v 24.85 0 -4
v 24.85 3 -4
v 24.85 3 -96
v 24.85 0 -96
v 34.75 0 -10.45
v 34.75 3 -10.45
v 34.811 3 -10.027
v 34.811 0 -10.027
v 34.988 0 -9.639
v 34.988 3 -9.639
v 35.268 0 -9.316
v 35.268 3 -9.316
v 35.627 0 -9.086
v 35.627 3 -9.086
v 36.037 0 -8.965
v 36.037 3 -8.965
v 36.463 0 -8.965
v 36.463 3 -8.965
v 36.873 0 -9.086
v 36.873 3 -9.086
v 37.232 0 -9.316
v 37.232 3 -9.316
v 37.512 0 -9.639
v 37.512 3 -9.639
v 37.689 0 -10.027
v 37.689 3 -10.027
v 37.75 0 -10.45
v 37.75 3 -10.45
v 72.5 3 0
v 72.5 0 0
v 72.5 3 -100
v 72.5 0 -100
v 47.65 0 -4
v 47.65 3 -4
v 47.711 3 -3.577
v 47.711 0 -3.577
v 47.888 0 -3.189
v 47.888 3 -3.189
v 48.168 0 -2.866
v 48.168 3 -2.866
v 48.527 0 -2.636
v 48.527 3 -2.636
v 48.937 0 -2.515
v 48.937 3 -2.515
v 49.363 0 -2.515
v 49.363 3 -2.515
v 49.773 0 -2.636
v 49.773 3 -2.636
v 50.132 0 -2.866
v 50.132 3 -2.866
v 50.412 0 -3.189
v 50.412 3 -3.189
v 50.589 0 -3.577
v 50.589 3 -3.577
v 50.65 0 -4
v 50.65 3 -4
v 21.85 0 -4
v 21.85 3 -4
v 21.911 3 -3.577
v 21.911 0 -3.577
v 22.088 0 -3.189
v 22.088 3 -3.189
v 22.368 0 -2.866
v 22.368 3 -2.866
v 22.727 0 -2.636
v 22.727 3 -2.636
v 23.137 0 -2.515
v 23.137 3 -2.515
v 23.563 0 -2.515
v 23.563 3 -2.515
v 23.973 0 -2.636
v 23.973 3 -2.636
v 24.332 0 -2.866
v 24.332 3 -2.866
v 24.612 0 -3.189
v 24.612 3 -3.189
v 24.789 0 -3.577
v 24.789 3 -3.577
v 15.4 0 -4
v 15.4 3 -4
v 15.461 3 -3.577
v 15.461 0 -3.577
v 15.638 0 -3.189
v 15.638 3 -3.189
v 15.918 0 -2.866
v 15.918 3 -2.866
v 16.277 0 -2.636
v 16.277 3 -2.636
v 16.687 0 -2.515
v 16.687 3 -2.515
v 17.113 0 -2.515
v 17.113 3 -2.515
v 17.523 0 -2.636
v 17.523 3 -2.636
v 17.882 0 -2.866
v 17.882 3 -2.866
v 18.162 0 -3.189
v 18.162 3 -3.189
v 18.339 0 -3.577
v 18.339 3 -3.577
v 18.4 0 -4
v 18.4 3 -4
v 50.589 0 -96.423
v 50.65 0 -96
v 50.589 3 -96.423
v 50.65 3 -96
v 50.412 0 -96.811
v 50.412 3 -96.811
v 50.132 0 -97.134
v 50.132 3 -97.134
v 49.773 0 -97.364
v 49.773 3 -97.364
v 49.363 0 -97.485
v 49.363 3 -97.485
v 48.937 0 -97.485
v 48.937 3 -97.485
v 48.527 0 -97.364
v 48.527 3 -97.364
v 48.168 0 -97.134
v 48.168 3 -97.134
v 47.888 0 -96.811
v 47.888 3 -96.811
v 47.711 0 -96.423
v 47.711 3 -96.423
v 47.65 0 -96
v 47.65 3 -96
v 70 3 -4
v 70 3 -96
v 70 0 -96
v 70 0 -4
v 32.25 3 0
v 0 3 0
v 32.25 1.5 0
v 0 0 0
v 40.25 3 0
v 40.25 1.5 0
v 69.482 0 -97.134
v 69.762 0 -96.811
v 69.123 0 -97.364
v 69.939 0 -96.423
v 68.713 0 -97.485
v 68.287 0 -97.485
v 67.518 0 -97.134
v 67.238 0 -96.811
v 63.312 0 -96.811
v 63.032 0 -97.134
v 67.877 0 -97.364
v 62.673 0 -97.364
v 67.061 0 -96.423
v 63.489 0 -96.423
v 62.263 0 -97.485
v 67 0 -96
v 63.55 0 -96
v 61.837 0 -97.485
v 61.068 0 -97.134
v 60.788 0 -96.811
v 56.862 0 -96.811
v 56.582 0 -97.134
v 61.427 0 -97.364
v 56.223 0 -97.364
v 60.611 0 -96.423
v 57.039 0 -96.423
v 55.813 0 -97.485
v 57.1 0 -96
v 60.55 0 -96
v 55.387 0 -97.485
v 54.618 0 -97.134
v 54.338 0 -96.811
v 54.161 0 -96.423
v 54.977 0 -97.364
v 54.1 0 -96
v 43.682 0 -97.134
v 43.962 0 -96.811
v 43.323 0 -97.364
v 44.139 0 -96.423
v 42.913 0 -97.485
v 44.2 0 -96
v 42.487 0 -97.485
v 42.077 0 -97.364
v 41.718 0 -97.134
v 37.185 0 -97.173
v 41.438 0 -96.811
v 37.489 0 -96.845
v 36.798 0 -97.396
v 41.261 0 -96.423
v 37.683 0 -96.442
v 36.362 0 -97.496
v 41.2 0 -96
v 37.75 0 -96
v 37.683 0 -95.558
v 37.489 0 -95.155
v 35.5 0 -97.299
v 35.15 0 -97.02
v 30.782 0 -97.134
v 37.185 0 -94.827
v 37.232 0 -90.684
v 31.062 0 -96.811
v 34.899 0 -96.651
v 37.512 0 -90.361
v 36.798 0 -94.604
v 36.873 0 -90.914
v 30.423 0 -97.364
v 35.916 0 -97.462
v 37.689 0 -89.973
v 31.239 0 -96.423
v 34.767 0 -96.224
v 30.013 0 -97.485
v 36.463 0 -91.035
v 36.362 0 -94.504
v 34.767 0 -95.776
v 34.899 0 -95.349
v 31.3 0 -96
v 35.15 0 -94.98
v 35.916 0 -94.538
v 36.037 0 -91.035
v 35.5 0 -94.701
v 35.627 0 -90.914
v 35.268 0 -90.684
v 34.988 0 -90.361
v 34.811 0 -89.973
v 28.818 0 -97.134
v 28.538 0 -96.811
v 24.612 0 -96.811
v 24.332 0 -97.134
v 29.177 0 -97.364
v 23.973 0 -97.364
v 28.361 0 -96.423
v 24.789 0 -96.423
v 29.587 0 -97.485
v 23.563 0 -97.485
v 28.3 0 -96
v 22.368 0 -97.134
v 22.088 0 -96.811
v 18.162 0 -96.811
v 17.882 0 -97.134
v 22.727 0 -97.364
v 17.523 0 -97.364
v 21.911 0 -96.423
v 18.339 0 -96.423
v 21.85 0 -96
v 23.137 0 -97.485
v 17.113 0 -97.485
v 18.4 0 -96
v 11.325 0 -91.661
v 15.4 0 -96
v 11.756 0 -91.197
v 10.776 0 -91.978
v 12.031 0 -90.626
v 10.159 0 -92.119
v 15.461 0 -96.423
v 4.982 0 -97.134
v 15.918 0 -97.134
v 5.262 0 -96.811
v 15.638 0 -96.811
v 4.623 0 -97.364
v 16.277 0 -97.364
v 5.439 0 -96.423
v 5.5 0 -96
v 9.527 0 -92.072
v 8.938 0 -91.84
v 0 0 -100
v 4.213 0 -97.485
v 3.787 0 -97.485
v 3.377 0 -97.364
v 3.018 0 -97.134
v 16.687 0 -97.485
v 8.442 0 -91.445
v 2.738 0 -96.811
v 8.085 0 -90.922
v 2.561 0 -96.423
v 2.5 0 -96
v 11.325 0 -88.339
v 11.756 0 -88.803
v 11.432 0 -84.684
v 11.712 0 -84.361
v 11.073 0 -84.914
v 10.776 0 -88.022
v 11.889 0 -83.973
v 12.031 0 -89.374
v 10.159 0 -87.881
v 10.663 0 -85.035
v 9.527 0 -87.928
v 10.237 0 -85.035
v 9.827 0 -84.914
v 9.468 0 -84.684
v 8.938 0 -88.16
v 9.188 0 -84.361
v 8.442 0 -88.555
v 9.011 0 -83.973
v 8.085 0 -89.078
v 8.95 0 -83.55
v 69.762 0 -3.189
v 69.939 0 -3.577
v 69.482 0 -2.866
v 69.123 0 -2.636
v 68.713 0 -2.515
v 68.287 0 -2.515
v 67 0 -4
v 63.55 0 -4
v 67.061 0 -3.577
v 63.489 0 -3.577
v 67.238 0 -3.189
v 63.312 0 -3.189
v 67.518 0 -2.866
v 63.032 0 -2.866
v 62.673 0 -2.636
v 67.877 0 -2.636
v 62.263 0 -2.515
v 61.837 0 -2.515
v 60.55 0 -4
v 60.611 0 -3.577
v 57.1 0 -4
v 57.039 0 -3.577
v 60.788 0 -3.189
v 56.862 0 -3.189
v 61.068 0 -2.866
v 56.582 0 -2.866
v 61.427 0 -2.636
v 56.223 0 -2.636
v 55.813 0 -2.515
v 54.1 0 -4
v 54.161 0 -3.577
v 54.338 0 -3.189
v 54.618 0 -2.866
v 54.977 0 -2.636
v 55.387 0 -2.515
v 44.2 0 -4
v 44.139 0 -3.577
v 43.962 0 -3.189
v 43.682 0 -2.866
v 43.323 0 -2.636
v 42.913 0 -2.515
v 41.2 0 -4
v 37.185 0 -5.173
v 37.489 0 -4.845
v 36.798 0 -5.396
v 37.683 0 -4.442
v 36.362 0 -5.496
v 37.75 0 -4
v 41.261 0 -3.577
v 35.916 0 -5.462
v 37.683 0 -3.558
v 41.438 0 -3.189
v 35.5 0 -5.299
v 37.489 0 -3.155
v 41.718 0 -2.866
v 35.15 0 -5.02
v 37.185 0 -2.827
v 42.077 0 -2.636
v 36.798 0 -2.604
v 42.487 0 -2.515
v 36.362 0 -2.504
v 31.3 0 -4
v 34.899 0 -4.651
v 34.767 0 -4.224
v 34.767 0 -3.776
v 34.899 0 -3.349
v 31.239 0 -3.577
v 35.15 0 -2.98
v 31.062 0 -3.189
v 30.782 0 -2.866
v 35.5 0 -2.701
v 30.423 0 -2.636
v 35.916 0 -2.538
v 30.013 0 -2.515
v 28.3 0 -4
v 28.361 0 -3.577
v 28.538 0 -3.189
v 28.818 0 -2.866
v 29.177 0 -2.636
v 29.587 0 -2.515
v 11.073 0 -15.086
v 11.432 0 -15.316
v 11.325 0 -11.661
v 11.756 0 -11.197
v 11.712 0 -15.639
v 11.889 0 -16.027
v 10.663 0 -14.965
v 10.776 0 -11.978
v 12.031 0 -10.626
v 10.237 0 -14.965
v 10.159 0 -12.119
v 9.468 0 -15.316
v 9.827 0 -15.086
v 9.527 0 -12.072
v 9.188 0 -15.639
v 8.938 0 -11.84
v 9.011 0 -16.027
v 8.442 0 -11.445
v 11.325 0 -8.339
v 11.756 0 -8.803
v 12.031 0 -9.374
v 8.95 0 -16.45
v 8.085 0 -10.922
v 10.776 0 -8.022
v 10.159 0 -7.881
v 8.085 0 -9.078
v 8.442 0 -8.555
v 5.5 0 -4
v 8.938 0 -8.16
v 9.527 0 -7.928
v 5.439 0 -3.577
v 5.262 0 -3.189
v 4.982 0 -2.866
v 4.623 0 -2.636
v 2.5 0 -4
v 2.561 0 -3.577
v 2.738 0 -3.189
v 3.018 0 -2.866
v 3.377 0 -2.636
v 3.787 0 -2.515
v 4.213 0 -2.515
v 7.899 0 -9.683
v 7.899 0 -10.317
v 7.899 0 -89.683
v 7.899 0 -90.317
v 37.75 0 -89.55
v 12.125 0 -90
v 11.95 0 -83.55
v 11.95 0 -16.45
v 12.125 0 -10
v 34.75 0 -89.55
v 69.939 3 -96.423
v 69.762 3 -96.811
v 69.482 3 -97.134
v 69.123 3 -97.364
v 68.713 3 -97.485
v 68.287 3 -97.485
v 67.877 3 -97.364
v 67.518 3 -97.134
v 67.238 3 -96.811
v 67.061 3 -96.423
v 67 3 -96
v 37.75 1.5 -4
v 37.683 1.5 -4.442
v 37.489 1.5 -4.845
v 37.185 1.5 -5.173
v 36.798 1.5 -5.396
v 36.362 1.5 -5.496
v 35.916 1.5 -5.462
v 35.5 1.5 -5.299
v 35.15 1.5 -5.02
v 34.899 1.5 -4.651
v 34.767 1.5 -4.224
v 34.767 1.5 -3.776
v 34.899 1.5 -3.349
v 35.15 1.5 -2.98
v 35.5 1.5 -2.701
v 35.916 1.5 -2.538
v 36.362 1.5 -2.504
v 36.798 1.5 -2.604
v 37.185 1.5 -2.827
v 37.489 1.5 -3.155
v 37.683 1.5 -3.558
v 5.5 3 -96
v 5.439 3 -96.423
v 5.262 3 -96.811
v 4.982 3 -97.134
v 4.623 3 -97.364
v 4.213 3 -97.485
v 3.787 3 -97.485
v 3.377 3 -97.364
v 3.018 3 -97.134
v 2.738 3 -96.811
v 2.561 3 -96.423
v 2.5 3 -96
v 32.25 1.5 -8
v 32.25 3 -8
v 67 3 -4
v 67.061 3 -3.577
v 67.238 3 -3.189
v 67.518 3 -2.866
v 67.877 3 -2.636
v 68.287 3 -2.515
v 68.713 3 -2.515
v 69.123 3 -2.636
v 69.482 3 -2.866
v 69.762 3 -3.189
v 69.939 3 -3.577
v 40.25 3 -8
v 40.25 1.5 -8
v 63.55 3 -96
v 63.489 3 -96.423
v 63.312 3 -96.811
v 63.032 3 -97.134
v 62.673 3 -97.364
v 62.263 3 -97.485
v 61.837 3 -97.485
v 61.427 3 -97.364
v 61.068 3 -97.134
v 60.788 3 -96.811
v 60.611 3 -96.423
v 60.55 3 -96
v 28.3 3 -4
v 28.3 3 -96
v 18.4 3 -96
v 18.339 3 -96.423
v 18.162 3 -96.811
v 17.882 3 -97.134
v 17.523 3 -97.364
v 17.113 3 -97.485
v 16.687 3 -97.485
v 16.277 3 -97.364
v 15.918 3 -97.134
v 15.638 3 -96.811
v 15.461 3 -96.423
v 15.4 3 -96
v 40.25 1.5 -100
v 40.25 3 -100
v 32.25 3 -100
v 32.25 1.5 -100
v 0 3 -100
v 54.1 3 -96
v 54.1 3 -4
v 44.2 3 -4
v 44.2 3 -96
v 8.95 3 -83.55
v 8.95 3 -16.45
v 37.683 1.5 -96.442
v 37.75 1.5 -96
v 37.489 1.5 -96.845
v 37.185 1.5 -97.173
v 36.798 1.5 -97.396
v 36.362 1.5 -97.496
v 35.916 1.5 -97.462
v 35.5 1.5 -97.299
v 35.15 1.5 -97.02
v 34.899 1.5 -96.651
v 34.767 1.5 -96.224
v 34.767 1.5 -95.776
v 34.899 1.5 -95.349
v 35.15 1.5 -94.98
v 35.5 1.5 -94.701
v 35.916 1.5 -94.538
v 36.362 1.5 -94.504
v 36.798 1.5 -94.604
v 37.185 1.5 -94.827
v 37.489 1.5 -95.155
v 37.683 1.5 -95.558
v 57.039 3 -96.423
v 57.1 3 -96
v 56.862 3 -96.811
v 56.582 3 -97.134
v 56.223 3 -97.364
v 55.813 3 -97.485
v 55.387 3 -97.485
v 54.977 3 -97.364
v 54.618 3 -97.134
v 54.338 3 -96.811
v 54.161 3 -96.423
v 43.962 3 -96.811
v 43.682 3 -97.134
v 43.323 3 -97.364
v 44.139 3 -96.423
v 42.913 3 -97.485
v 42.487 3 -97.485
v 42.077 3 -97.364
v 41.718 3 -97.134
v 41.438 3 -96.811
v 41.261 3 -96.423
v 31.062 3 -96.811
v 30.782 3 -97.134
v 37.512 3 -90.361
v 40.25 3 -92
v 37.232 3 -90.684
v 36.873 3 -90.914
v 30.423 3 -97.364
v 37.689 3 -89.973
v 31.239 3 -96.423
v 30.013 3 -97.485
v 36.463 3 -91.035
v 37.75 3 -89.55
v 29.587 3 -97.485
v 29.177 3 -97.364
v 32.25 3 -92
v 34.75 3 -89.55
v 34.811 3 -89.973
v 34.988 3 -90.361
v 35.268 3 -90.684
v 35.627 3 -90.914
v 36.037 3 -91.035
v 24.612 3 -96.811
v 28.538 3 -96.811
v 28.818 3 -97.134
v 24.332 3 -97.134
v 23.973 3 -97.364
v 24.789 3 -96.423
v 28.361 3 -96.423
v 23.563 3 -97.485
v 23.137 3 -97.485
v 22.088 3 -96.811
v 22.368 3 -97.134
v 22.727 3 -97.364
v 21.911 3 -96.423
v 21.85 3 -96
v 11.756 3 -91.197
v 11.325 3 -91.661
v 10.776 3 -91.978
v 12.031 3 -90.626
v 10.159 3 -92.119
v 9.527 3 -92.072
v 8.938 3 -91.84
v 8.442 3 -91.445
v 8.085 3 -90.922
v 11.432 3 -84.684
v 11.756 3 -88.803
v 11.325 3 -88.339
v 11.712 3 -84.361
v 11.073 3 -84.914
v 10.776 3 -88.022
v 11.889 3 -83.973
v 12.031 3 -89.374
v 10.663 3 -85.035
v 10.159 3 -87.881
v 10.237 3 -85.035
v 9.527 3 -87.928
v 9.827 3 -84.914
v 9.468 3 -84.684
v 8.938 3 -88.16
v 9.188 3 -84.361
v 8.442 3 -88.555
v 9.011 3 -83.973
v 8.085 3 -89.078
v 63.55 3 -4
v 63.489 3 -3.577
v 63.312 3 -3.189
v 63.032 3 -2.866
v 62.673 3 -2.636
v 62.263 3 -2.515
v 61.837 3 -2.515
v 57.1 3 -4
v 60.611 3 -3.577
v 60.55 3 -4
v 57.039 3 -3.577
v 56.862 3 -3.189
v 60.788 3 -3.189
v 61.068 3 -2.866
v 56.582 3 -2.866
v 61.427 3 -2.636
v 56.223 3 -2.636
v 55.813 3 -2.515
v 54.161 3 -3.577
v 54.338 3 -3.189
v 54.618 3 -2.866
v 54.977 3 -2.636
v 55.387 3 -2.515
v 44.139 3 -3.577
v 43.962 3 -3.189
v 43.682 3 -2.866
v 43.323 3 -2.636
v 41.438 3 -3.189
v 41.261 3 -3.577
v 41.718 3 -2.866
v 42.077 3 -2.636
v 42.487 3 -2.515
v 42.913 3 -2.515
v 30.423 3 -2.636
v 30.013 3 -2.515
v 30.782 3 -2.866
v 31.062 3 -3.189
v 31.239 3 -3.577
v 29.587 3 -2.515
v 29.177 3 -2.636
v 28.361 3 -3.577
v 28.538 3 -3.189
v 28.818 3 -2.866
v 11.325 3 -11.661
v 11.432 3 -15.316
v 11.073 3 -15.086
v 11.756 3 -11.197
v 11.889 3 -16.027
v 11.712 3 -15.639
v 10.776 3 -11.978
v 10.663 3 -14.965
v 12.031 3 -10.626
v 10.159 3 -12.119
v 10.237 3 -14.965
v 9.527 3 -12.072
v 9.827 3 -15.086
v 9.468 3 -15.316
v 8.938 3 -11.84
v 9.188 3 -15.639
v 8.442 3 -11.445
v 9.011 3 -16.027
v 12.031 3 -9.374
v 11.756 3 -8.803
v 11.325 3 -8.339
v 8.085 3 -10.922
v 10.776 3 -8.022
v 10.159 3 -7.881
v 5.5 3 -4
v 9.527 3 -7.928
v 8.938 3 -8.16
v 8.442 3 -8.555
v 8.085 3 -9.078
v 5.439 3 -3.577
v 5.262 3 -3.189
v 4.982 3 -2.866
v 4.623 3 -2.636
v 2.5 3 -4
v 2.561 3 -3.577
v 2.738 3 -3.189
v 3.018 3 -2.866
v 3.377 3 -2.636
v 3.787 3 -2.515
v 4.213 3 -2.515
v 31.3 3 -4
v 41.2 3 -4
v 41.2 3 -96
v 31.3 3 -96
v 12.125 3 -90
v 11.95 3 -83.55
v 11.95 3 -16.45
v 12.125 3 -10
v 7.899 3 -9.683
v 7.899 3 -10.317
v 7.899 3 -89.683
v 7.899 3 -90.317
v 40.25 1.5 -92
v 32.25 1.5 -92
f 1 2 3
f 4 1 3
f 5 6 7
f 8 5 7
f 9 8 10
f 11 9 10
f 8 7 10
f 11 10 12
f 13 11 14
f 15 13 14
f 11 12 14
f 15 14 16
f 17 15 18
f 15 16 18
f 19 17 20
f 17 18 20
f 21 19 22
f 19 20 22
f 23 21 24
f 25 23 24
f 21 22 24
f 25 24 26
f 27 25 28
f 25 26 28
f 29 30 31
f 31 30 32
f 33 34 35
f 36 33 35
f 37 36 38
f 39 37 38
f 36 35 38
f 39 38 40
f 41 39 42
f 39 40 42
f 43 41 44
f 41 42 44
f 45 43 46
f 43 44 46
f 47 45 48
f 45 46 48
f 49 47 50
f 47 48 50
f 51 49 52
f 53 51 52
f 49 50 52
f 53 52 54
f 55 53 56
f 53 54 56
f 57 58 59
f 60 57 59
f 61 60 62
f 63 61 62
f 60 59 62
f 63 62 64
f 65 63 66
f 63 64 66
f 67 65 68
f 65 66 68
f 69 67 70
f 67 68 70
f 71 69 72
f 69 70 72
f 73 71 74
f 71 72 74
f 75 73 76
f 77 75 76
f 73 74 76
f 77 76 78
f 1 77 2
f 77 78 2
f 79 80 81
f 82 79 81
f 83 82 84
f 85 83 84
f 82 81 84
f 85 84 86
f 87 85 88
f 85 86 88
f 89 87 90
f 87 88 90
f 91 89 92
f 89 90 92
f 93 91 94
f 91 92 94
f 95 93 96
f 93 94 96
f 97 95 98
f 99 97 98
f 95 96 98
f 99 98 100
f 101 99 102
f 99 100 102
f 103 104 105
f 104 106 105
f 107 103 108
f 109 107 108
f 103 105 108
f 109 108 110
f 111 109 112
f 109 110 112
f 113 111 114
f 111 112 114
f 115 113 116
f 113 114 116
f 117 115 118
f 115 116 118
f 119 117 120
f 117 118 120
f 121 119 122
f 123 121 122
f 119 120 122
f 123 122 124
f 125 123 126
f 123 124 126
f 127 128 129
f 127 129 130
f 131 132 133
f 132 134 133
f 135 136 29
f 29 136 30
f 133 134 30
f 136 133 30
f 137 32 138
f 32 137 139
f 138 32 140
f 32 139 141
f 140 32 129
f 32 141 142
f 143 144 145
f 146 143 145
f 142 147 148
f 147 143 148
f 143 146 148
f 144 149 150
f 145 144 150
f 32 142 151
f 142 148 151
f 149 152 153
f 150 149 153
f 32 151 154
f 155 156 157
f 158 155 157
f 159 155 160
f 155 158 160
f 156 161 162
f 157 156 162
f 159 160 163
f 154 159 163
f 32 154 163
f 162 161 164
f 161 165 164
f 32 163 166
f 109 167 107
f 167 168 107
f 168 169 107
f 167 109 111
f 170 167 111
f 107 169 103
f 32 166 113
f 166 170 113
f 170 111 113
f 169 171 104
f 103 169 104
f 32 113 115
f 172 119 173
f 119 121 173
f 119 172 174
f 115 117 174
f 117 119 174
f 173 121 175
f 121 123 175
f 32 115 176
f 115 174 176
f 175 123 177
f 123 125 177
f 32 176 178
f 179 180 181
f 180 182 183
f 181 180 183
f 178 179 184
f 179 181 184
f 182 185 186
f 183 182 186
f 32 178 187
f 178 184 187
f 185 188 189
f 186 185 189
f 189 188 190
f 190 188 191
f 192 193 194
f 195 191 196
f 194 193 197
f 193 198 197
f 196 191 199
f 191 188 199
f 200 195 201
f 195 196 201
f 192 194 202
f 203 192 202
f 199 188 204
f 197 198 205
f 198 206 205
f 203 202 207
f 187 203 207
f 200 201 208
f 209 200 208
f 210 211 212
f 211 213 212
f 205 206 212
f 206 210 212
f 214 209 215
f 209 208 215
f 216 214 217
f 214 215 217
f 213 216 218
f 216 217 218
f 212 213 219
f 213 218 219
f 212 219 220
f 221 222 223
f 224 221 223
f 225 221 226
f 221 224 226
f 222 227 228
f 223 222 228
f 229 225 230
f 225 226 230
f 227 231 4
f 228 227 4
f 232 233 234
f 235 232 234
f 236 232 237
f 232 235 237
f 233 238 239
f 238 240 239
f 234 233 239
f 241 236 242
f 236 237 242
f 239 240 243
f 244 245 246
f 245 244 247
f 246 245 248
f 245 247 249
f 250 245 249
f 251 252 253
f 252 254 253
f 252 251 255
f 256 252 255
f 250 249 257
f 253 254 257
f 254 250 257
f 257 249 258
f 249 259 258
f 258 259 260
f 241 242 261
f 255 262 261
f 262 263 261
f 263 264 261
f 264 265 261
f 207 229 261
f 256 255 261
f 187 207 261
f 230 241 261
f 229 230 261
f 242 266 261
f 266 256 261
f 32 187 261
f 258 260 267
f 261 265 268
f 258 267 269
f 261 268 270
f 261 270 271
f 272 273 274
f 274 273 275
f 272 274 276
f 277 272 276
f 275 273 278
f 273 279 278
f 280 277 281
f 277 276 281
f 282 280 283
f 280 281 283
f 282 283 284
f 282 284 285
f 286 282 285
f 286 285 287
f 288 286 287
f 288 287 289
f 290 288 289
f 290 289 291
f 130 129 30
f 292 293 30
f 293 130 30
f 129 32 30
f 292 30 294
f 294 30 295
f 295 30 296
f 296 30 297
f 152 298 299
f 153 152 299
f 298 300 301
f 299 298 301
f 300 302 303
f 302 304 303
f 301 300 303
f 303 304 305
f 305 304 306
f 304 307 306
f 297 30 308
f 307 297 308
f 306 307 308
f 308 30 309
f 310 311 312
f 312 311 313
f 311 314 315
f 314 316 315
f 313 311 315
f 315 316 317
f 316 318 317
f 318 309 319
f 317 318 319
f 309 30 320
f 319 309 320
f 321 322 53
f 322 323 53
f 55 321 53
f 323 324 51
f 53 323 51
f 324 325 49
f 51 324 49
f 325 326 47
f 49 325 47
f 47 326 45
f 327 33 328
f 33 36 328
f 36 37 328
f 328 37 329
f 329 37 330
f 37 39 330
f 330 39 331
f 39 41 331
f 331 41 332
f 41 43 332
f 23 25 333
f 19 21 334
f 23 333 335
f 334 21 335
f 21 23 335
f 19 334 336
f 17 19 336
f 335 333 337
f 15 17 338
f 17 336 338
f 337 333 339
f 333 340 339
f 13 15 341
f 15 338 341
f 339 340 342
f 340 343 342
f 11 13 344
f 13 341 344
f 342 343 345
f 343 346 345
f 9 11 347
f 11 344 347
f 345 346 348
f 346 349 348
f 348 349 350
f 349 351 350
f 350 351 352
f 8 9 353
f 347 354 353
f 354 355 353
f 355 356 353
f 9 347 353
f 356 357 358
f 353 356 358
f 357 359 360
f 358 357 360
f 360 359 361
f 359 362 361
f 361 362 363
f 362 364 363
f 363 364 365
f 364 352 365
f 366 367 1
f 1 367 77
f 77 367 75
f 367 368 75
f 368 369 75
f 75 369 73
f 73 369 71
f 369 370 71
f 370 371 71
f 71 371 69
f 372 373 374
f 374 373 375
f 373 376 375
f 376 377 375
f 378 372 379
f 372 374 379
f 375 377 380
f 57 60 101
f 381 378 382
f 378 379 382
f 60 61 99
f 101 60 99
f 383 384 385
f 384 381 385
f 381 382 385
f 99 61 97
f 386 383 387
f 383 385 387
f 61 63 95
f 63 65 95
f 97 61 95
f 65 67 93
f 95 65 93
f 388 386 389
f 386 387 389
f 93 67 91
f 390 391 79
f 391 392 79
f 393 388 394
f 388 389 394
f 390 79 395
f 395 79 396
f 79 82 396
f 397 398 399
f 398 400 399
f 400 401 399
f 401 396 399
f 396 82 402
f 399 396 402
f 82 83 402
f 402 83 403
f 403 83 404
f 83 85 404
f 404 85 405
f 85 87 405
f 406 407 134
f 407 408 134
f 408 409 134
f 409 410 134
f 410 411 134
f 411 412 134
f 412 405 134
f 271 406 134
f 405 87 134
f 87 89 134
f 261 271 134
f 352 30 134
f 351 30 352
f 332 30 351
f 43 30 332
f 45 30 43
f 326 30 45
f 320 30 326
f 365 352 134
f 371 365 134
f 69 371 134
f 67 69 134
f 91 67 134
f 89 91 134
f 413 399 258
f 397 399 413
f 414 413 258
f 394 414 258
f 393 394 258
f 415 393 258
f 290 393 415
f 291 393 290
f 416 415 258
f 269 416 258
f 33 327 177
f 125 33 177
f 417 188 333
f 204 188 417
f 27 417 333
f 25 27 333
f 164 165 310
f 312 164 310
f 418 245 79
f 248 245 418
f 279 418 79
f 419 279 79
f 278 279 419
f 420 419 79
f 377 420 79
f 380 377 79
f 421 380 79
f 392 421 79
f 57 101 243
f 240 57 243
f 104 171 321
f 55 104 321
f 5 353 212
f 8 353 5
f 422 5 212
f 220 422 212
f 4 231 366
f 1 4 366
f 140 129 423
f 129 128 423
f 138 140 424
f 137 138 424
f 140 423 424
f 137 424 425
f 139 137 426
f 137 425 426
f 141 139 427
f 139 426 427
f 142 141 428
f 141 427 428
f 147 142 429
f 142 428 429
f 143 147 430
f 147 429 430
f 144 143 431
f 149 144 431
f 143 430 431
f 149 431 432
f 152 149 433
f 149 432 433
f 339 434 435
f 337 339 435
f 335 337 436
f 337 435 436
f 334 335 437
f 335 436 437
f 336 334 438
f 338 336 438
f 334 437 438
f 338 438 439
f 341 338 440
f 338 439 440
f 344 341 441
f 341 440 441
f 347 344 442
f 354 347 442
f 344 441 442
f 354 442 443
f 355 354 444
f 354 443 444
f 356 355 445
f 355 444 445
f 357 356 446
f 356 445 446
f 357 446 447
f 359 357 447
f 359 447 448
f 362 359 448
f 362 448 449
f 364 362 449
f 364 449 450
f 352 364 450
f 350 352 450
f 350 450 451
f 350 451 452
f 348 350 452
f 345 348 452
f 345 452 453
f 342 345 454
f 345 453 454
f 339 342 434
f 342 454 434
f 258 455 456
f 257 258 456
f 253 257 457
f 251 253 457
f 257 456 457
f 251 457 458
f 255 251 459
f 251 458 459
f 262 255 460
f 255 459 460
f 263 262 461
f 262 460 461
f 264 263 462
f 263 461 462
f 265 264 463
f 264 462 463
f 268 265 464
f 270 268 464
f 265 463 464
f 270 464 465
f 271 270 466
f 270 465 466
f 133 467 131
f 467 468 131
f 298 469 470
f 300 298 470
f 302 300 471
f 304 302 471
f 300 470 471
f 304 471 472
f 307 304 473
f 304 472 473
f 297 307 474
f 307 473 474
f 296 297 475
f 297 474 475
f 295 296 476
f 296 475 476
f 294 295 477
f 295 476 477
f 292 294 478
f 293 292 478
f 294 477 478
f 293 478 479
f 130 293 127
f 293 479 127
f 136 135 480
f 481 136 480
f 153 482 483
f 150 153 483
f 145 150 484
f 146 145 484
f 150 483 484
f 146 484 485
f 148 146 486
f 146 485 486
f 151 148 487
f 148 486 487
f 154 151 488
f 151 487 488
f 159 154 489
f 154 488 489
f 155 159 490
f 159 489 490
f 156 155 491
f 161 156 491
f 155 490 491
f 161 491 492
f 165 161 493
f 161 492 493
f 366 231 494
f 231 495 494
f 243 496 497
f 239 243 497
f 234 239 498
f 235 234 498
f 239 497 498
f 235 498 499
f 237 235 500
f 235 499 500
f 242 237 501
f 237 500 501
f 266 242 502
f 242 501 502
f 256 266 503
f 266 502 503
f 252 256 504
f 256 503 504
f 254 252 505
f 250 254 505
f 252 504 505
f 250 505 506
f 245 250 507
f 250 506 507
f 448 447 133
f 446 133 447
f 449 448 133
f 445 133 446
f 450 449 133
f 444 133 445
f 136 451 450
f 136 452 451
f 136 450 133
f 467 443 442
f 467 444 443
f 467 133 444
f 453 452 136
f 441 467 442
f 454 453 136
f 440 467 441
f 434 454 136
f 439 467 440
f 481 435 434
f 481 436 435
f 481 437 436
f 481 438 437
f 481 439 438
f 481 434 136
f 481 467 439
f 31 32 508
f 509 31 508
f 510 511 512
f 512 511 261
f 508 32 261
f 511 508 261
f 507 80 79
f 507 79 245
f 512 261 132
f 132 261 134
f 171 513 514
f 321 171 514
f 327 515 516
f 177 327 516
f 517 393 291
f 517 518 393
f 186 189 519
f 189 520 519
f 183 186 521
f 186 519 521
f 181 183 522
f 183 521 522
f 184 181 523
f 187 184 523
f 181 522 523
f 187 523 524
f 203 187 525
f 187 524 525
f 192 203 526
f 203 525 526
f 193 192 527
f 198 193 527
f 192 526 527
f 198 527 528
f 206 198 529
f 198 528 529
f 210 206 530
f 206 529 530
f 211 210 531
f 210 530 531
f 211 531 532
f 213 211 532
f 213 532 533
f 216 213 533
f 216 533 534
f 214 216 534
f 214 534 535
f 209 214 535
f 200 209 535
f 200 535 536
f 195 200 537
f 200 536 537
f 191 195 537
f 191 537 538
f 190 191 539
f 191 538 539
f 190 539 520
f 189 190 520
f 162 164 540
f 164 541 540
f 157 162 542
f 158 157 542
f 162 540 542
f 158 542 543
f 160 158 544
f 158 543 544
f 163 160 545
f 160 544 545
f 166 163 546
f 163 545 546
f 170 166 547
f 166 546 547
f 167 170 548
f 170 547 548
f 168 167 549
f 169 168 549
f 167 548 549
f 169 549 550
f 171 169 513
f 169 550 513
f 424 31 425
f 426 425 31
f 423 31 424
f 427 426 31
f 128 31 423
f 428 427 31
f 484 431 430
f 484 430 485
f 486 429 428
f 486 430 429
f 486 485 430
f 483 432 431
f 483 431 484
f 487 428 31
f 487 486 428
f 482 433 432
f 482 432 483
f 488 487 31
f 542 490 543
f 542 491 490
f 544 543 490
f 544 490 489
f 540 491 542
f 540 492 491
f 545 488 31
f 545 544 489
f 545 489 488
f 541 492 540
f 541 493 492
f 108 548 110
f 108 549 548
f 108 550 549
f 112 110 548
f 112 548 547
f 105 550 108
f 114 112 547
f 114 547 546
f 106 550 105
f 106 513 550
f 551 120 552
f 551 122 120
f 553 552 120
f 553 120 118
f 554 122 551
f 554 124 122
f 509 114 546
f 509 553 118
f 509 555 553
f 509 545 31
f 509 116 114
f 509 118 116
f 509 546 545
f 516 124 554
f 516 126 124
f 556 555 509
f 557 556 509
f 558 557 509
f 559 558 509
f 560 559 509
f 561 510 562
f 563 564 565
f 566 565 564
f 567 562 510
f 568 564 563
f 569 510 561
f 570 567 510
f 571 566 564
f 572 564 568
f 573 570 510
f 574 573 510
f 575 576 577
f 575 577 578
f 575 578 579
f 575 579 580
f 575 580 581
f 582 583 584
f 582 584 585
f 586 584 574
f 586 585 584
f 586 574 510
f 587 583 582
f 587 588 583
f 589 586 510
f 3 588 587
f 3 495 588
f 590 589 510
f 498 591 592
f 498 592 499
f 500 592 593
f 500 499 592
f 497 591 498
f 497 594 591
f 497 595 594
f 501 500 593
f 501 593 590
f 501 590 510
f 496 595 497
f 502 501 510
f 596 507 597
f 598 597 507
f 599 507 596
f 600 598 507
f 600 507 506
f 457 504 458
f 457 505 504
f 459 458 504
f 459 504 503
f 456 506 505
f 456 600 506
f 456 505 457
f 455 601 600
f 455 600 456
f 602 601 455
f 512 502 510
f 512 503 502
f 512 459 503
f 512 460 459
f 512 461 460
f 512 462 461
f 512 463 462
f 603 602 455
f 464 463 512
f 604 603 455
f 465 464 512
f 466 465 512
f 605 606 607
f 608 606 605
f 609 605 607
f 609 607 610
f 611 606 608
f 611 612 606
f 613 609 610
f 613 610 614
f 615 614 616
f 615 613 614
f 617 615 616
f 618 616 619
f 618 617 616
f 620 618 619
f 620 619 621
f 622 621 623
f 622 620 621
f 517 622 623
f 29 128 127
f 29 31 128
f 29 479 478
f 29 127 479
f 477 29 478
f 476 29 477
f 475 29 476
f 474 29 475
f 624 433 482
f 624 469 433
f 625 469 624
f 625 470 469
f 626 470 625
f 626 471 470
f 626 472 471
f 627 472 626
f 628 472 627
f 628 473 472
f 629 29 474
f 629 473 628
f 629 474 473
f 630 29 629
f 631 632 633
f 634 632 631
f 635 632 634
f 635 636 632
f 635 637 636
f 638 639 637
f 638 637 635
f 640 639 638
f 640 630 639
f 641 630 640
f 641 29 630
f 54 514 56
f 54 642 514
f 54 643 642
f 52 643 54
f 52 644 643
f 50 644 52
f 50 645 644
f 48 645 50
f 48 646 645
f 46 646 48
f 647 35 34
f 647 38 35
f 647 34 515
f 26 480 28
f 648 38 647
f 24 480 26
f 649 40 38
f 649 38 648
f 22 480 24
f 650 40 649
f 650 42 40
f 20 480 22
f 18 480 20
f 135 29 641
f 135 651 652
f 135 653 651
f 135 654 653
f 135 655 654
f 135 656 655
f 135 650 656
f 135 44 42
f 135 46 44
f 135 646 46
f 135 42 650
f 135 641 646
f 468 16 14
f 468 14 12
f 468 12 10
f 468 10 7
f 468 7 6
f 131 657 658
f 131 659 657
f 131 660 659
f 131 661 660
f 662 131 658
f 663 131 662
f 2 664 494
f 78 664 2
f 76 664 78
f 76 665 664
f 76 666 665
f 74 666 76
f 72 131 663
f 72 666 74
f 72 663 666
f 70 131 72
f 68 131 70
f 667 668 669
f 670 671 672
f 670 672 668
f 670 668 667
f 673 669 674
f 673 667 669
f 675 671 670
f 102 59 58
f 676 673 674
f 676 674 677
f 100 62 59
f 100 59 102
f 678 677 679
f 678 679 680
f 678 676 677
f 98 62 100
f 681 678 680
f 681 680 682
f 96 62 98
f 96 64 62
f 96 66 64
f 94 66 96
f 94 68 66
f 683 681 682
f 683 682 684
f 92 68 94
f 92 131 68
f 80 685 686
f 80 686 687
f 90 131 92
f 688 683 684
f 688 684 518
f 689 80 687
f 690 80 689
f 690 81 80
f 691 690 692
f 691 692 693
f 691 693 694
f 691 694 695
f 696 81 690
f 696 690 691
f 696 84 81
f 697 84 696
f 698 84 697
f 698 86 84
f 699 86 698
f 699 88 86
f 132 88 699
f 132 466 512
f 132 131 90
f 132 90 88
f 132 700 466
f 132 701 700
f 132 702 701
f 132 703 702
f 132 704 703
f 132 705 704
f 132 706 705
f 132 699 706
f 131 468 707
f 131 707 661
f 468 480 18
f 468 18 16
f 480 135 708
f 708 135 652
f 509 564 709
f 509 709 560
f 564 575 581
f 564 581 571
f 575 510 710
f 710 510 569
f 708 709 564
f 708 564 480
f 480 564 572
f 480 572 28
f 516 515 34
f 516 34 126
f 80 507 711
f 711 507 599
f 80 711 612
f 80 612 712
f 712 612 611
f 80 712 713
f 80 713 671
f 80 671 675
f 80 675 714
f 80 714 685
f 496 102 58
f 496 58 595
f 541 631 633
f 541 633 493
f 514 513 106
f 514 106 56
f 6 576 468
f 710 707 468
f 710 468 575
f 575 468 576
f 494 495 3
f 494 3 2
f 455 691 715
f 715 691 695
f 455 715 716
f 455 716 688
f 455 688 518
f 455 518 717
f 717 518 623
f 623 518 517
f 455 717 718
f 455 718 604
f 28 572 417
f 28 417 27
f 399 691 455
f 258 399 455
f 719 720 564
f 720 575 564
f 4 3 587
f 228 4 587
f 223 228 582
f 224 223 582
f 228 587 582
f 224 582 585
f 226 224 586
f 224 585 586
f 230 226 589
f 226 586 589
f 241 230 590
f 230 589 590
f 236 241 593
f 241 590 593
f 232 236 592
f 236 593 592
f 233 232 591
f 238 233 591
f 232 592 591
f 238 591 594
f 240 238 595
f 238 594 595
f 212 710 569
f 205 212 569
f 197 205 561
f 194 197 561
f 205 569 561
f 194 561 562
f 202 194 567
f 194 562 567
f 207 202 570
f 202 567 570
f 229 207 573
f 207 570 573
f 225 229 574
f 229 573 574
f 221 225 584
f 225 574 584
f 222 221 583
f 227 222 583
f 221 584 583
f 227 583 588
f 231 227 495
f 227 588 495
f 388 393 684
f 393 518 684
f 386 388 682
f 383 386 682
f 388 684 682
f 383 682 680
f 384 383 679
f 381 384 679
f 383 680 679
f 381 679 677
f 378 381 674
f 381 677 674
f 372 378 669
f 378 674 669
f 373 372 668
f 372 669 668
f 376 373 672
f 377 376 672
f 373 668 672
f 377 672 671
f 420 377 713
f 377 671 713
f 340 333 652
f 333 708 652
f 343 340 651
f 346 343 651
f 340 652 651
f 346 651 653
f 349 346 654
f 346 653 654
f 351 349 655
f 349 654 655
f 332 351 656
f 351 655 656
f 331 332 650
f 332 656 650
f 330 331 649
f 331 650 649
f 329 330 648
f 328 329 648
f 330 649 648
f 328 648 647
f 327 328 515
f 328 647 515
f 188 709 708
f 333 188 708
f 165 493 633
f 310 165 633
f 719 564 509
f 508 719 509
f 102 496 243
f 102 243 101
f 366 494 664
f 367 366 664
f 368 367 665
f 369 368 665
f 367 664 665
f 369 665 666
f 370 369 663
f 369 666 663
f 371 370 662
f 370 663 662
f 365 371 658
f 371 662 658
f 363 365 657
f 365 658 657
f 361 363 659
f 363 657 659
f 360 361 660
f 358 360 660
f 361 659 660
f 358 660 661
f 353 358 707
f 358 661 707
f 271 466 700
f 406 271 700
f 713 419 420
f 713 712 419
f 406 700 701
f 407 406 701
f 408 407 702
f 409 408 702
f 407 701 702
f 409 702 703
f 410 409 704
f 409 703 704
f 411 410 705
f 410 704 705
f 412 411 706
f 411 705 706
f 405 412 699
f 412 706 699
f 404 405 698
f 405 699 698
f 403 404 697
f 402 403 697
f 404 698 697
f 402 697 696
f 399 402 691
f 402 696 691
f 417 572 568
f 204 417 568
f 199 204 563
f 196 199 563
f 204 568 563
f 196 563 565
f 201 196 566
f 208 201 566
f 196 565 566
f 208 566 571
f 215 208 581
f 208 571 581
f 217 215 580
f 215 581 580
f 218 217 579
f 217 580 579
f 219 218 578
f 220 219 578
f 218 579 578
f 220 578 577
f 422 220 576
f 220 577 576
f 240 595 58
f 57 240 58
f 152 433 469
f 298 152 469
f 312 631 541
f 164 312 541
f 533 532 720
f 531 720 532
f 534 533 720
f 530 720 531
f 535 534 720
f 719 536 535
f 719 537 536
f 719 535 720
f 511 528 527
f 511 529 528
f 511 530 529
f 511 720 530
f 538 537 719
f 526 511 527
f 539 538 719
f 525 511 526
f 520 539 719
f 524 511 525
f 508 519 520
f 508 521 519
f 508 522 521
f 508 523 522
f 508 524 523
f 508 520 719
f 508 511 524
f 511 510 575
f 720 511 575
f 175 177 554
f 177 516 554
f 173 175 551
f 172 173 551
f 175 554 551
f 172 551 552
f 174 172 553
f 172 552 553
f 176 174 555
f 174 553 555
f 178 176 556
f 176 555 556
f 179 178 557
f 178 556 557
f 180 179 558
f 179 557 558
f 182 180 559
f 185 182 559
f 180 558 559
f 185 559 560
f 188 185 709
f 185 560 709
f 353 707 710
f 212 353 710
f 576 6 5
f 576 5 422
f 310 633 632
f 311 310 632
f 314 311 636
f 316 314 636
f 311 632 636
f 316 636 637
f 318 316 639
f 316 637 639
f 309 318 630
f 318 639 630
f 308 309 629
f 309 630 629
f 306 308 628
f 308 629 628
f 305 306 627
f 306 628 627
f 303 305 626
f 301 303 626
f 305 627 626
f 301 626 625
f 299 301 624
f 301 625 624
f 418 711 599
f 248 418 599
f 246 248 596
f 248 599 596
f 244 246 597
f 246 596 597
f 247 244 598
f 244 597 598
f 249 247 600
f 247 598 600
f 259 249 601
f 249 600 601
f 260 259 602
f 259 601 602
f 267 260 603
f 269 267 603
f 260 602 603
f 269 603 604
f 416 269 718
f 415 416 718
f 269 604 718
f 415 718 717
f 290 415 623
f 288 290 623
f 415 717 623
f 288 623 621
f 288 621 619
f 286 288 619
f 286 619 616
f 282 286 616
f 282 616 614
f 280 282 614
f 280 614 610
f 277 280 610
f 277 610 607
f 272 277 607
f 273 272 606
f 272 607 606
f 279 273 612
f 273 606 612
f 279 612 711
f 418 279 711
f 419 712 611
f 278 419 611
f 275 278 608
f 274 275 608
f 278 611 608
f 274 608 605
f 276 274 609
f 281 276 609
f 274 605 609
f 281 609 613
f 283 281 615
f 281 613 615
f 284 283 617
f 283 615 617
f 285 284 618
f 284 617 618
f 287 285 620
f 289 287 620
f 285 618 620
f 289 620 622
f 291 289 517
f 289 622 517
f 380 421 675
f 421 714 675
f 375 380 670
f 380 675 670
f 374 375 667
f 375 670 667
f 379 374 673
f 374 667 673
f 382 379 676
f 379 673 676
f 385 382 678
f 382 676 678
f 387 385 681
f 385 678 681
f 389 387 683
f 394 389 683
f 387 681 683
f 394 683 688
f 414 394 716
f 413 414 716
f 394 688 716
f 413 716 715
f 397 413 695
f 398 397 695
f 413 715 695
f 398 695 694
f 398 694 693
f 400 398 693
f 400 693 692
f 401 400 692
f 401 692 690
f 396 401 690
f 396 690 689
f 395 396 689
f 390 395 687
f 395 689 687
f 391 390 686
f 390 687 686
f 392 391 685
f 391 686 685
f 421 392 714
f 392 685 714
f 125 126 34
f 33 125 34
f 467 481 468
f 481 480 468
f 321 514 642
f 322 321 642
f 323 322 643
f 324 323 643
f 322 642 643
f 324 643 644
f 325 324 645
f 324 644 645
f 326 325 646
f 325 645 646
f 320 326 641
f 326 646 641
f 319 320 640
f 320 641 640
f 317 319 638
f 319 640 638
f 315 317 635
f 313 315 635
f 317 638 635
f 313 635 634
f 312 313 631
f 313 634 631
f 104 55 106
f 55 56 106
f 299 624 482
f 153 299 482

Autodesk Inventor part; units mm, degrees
ref_plane "YZ Plane" through (0, 0, 0) normal (1, 0, 0) x (0, 1, 0)
ref_plane "XZ Plane" through (0, 0, 0) normal (0, 1, 0) x (-1, 0, 0)
ref_plane "XY Plane" through (0, 0, 0) normal (0, 0, 1) x (1, 0, 0)
sketch "Sketch1" plane through (0, 0, 0) normal (0, 1, 0) x (-1, 0, 0)
  line L0 (0, 0) -> (-72.5, 0)
  line L1 (-72.5, 0) -> (-72.5, -100)
  line L2 (-72.5, -100) -> (0, -100)
  line L3 (0, -100) -> (0, 0)
  dimension "d0" = 72.5
  dimension "d1" = 100
extrude "Extrusion1" add sketch "Sketch1" along normal blind 3
sketch "Sketch7" plane through (0, 3, 0) normal (0, 1, 0) x (1, 0, 0)
  line L0 (72.5, 100) -> (0, 100) projected
  line L1 (0, 0) -> (72.5, 0)
  line L2 (72.5, 0) -> (72.5, 100)
  line L3 (72.5, 100) -> (0, 100)
  line L4 (0, 100) -> (0, 0)
  line L5 (0, 0) -> (0, 9.525)
  line L6 (0, 0) -> (10, 0)
  line L7 (10, 0) -> (10, 10)
  line L8 (10, 10) -> (0, 10)
  line L9 (0, 10) -> (0, 0)
  line L10 (0, 100) -> (10, 100)
  line L11 (10, 100) -> (10, 90)
  line L12 (10, 90) -> (0, 90)
  line L13 (0, 90) -> (0, 100)
  line L14 (72.5, 100) -> (62.5, 100)
  line L15 (62.5, 100) -> (62.5, 90)
  line L16 (62.5, 90) -> (72.5, 90)
  line L17 (72.5, 90) -> (72.5, 100)
  circle A0 centre (95, 95) radius 1.5
  line L18 (72.5, 0) -> (62.5, 0)
  line L19 (62.5, 0) -> (62.5, 10)
  line L20 (62.5, 10) -> (72.5, 10)
  line L21 (72.5, 10) -> (72.5, 0)
  circle A1 centre (95, 5) radius 1.5
  circle A2 centre (10, 90) radius 2.125
  circle A3 centre (10, 10) radius 2.125
  point P0 (41.25, 100)
  dimension "d36" = 10
  dimension "d37" = 10
  dimension "d39" = 10
  dimension "d40" = 10
  dimension "d42" = 10
  dimension "d43" = 10
  dimension "d44" = 3
  dimension "d45" = 10
  dimension "d46" = 10
  dimension "d47" = 3
  dimension "d181" = 4.25
  dimension "d182" = 4.25
extrude "Extrusion7" cut sketch "Sketch7" against normal blind 3 contours A2 L12 L11 | L11 L12 A2 | A3 L7 L8 | L8 L7 A3 | A0 | A1
sketch "Sketch11" plane through (0, 3, 0) normal (0, 1, 0) x (1, 0, 0)
  point P0 (0, 0)
sketch "Sketch13" plane through (0, 3, 0) normal (0, 1, 0) x (1, 0, 0)
  line L0 (0, 0) -> (72.5, 0) projected
  line L1 (36.25, 0) -> (36.25, 8)
  line L2 (36.25, 8) -> (32.25, 8)
  line L3 (32.25, 8) -> (32.25, 0)
  line L4 (36.25, 0) -> (32.25, 0)
  line L5 (36.25, 0) -> (40.25, 0)
  line L6 (40.25, 0) -> (40.25, 8)
  line L7 (40.25, 8) -> (36.25, 8)
  line L8 (72.5, 100) -> (0, 100) projected
  line L9 (36.25, 100) -> (32.25, 100)
  line L10 (32.25, 100) -> (32.25, 92)
  line L11 (32.25, 92) -> (40.25, 92)
  line L12 (40.25, 92) -> (40.25, 100)
  line L13 (40.25, 100) -> (36.25, 100)
  line L14 (72.5, 0) -> (72.5, 100) projected
  dimension "d190" = 8
  dimension "d191" = 4
  dimension "d192" = 4
  dimension "d193" = 8
extrude "Extrusion11" cut sketch "Sketch13" against normal blind 1.5
sketch "Sketch14" plane through (0, 1.5, 0) normal (0, 1, 0) x (1, 0, 0)
  line L0 (0, 0) -> (72.5, 0) projected
  line L1 (40.25, 8) -> (32.25, 8)
  line L2 (32.25, 8) -> (32.25, 0)
  line L3 (32.25, 0) -> (40.25, 0)
  line L4 (40.25, 0) -> (40.25, 8)
  line L5 (72.5, 100) -> (0, 100) projected
  line L6 (40.25, 100) -> (32.25, 100)
  line L7 (32.25, 100) -> (32.25, 92)
  line L8 (32.25, 92) -> (40.25, 92)
  line L9 (40.25, 92) -> (40.25, 100)
  circle A0 centre (36.25, 4) radius 1.5
  circle A1 centre (36.25, 96) radius 1.5
  point P0 (72.5, 46)
  point P1 (64.5, 54)
  dimension "d199" = 8
  dimension "d200" = 8
  dimension "d201" = 3
  dimension "d202" = 3
extrude "Extrusion12" cut sketch "Sketch14" against normal blind 1.5 contours A0 | A1
sketch "Sketch15" plane through (0, 3, 0) normal (0, 1, 0) x (1, 0, 0)
  circle A0 centre (36.25, 4) radius 1.5 projected
  line L0 (0, 100) -> (0, 0) projected
  circle A1 centre (36.25, 96) radius 1.5 projected
  line L1 (32.25, 8) -> (40.25, 8) projected
  arc A2 (2.5, 4) -> (5.5, 4) centre (4, 4) ccw
  arc A3 (15.4, 4) -> (18.4, 4) centre (16.9, 4) ccw
  arc A4 (21.85, 4) -> (24.85, 4) centre (23.35, 4) ccw
  arc A5 (28.3, 4) -> (31.3, 4) centre (29.8, 4) ccw
  arc A6 (41.2, 4) -> (44.2, 4) centre (42.7, 4) ccw
  arc A7 (47.65, 4) -> (50.65, 4) centre (49.15, 4) ccw
  arc A8 (54.1, 4) -> (57.1, 4) centre (55.6, 4) ccw
  arc A9 (60.55, 4) -> (63.55, 4) centre (62.05, 4) ccw
  arc A10 (67, 4) -> (70, 4) centre (68.5, 4) ccw
  arc A11 (70, 96) -> (67, 96) centre (68.5, 96) ccw
  arc A12 (63.55, 96) -> (60.55, 96) centre (62.05, 96) ccw
  arc A13 (57.1, 96) -> (54.1, 96) centre (55.6, 96) ccw
  arc A14 (50.65, 96) -> (47.65, 96) centre (49.15, 96) ccw
  arc A15 (44.2, 96) -> (41.2, 96) centre (42.7, 96) ccw
  arc A16 (31.3, 96) -> (28.3, 96) centre (29.8, 96) ccw
  arc A17 (24.85, 96) -> (21.85, 96) centre (23.35, 96) ccw
  arc A18 (18.4, 96) -> (15.4, 96) centre (16.9, 96) ccw
  arc A19 (5.5, 96) -> (2.5, 96) centre (4, 96) ccw
  circle A20 centre (10, 90) radius 2.125 projected
  line L2 (10, 90) -> (10.45, 90)
  line L3 (10.45, 90) -> (10.45, 83.55)
  arc A21 (11.95, 83.55) -> (8.95, 83.55) centre (10.45, 83.55) ccw
  circle A22 centre (10, 10) radius 2.125 projected
  line L4 (10, 10) -> (10.45, 10)
  line L5 (10.45, 10) -> (10.45, 16.45)
  arc A23 (8.95, 16.45) -> (11.95, 16.45) centre (10.45, 16.45) ccw
  line L6 (5.5, 4) -> (5.5, 96)
  line L7 (2.5, 96) -> (2.5, 4)
  line L8 (8.95, 16.45) -> (8.95, 83.55)
  line L9 (11.95, 83.55) -> (11.95, 16.45)
  line L10 (15.4, 4) -> (15.4, 96)
  line L11 (18.4, 96) -> (18.4, 4)
  line L12 (21.85, 96) -> (21.85, 4)
  line L13 (24.85, 4) -> (24.85, 96)
  line L14 (28.3, 96) -> (28.3, 4)
  line L15 (31.3, 4) -> (31.3, 96)
  line L16 (41.2, 96) -> (41.2, 4)
  line L17 (44.2, 4) -> (44.2, 96)
  line L18 (47.65, 96) -> (47.65, 4)
  line L19 (50.65, 4) -> (50.65, 96)
  line L20 (54.1, 96) -> (54.1, 4)
  line L21 (57.1, 4) -> (57.1, 96)
  line L22 (60.55, 96) -> (60.55, 4)
  line L23 (63.55, 4) -> (63.55, 96)
  line L24 (67, 43.55) -> (67, 4)
  line L25 (70, 4) -> (70, 43.55)
  line L26 (67, 56.45) -> (67, 96)
  line L27 (70, 96) -> (70, 56.45)
  line L28 (36.25, 4) -> (36.25, 10.45)
  arc A24 (34.75, 10.45) -> (37.75, 10.45) centre (36.25, 10.45) ccw
  line L29 (36.25, 96) -> (36.25, 89.55)
  arc A25 (37.75, 89.55) -> (34.75, 89.55) centre (36.25, 89.55) ccw
  line L30 (34.75, 10.45) -> (34.75, 89.55)
  line L31 (37.75, 89.55) -> (37.75, 10.45)
  line L32 (67, 56.45) -> (67, 43.55)
  line L33 (70, 43.55) -> (70, 56.45)
  dimension "d216" = 3
  dimension "d217" = 3
  dimension "d218" = 3
  dimension "d219" = 3
  dimension "d220" = 3
  dimension "d221" = 3
  dimension "d225" = 3
  dimension "d226" = 3
  dimension "d227" = 3
  dimension "d228" = 3
  dimension "d229" = 3
  dimension "d230" = 3
  dimension "d231" = 3
  dimension "d232" = 3
  dimension "d233" = 3
  dimension "d234" = 6.45
  dimension "d235" = 3
  dimension "d236" = 6.45
  dimension "d237" = 3
  dimension "d242" = 6.45
  dimension "d243" = 3
  dimension "d244" = 6.45
  dimension "d245" = 3
extrude "Extrusion13" cut sketch "Sketch15" against normal blind 3 contours A24 L30 A25 L31 | L7 A19 L6 A2 | L10 A18 L11 A3 | L12 A17 L13 A4 | L14 A16 L15 A5 | L16 A15 L17 A6 | L18 A14 L19 A7 | L20 A13 L21 A8 | L22 A12 L23 A9 | L24 L32 L26 A11 L27 L33 L25 A10 | A21 L9 A23 L8
sketch "Sketch16" plane through (0, 3, 0) normal (0, 1, 0) x (1, 0, 0)
  point P0 (0, 0)
properties part number "Tray"
